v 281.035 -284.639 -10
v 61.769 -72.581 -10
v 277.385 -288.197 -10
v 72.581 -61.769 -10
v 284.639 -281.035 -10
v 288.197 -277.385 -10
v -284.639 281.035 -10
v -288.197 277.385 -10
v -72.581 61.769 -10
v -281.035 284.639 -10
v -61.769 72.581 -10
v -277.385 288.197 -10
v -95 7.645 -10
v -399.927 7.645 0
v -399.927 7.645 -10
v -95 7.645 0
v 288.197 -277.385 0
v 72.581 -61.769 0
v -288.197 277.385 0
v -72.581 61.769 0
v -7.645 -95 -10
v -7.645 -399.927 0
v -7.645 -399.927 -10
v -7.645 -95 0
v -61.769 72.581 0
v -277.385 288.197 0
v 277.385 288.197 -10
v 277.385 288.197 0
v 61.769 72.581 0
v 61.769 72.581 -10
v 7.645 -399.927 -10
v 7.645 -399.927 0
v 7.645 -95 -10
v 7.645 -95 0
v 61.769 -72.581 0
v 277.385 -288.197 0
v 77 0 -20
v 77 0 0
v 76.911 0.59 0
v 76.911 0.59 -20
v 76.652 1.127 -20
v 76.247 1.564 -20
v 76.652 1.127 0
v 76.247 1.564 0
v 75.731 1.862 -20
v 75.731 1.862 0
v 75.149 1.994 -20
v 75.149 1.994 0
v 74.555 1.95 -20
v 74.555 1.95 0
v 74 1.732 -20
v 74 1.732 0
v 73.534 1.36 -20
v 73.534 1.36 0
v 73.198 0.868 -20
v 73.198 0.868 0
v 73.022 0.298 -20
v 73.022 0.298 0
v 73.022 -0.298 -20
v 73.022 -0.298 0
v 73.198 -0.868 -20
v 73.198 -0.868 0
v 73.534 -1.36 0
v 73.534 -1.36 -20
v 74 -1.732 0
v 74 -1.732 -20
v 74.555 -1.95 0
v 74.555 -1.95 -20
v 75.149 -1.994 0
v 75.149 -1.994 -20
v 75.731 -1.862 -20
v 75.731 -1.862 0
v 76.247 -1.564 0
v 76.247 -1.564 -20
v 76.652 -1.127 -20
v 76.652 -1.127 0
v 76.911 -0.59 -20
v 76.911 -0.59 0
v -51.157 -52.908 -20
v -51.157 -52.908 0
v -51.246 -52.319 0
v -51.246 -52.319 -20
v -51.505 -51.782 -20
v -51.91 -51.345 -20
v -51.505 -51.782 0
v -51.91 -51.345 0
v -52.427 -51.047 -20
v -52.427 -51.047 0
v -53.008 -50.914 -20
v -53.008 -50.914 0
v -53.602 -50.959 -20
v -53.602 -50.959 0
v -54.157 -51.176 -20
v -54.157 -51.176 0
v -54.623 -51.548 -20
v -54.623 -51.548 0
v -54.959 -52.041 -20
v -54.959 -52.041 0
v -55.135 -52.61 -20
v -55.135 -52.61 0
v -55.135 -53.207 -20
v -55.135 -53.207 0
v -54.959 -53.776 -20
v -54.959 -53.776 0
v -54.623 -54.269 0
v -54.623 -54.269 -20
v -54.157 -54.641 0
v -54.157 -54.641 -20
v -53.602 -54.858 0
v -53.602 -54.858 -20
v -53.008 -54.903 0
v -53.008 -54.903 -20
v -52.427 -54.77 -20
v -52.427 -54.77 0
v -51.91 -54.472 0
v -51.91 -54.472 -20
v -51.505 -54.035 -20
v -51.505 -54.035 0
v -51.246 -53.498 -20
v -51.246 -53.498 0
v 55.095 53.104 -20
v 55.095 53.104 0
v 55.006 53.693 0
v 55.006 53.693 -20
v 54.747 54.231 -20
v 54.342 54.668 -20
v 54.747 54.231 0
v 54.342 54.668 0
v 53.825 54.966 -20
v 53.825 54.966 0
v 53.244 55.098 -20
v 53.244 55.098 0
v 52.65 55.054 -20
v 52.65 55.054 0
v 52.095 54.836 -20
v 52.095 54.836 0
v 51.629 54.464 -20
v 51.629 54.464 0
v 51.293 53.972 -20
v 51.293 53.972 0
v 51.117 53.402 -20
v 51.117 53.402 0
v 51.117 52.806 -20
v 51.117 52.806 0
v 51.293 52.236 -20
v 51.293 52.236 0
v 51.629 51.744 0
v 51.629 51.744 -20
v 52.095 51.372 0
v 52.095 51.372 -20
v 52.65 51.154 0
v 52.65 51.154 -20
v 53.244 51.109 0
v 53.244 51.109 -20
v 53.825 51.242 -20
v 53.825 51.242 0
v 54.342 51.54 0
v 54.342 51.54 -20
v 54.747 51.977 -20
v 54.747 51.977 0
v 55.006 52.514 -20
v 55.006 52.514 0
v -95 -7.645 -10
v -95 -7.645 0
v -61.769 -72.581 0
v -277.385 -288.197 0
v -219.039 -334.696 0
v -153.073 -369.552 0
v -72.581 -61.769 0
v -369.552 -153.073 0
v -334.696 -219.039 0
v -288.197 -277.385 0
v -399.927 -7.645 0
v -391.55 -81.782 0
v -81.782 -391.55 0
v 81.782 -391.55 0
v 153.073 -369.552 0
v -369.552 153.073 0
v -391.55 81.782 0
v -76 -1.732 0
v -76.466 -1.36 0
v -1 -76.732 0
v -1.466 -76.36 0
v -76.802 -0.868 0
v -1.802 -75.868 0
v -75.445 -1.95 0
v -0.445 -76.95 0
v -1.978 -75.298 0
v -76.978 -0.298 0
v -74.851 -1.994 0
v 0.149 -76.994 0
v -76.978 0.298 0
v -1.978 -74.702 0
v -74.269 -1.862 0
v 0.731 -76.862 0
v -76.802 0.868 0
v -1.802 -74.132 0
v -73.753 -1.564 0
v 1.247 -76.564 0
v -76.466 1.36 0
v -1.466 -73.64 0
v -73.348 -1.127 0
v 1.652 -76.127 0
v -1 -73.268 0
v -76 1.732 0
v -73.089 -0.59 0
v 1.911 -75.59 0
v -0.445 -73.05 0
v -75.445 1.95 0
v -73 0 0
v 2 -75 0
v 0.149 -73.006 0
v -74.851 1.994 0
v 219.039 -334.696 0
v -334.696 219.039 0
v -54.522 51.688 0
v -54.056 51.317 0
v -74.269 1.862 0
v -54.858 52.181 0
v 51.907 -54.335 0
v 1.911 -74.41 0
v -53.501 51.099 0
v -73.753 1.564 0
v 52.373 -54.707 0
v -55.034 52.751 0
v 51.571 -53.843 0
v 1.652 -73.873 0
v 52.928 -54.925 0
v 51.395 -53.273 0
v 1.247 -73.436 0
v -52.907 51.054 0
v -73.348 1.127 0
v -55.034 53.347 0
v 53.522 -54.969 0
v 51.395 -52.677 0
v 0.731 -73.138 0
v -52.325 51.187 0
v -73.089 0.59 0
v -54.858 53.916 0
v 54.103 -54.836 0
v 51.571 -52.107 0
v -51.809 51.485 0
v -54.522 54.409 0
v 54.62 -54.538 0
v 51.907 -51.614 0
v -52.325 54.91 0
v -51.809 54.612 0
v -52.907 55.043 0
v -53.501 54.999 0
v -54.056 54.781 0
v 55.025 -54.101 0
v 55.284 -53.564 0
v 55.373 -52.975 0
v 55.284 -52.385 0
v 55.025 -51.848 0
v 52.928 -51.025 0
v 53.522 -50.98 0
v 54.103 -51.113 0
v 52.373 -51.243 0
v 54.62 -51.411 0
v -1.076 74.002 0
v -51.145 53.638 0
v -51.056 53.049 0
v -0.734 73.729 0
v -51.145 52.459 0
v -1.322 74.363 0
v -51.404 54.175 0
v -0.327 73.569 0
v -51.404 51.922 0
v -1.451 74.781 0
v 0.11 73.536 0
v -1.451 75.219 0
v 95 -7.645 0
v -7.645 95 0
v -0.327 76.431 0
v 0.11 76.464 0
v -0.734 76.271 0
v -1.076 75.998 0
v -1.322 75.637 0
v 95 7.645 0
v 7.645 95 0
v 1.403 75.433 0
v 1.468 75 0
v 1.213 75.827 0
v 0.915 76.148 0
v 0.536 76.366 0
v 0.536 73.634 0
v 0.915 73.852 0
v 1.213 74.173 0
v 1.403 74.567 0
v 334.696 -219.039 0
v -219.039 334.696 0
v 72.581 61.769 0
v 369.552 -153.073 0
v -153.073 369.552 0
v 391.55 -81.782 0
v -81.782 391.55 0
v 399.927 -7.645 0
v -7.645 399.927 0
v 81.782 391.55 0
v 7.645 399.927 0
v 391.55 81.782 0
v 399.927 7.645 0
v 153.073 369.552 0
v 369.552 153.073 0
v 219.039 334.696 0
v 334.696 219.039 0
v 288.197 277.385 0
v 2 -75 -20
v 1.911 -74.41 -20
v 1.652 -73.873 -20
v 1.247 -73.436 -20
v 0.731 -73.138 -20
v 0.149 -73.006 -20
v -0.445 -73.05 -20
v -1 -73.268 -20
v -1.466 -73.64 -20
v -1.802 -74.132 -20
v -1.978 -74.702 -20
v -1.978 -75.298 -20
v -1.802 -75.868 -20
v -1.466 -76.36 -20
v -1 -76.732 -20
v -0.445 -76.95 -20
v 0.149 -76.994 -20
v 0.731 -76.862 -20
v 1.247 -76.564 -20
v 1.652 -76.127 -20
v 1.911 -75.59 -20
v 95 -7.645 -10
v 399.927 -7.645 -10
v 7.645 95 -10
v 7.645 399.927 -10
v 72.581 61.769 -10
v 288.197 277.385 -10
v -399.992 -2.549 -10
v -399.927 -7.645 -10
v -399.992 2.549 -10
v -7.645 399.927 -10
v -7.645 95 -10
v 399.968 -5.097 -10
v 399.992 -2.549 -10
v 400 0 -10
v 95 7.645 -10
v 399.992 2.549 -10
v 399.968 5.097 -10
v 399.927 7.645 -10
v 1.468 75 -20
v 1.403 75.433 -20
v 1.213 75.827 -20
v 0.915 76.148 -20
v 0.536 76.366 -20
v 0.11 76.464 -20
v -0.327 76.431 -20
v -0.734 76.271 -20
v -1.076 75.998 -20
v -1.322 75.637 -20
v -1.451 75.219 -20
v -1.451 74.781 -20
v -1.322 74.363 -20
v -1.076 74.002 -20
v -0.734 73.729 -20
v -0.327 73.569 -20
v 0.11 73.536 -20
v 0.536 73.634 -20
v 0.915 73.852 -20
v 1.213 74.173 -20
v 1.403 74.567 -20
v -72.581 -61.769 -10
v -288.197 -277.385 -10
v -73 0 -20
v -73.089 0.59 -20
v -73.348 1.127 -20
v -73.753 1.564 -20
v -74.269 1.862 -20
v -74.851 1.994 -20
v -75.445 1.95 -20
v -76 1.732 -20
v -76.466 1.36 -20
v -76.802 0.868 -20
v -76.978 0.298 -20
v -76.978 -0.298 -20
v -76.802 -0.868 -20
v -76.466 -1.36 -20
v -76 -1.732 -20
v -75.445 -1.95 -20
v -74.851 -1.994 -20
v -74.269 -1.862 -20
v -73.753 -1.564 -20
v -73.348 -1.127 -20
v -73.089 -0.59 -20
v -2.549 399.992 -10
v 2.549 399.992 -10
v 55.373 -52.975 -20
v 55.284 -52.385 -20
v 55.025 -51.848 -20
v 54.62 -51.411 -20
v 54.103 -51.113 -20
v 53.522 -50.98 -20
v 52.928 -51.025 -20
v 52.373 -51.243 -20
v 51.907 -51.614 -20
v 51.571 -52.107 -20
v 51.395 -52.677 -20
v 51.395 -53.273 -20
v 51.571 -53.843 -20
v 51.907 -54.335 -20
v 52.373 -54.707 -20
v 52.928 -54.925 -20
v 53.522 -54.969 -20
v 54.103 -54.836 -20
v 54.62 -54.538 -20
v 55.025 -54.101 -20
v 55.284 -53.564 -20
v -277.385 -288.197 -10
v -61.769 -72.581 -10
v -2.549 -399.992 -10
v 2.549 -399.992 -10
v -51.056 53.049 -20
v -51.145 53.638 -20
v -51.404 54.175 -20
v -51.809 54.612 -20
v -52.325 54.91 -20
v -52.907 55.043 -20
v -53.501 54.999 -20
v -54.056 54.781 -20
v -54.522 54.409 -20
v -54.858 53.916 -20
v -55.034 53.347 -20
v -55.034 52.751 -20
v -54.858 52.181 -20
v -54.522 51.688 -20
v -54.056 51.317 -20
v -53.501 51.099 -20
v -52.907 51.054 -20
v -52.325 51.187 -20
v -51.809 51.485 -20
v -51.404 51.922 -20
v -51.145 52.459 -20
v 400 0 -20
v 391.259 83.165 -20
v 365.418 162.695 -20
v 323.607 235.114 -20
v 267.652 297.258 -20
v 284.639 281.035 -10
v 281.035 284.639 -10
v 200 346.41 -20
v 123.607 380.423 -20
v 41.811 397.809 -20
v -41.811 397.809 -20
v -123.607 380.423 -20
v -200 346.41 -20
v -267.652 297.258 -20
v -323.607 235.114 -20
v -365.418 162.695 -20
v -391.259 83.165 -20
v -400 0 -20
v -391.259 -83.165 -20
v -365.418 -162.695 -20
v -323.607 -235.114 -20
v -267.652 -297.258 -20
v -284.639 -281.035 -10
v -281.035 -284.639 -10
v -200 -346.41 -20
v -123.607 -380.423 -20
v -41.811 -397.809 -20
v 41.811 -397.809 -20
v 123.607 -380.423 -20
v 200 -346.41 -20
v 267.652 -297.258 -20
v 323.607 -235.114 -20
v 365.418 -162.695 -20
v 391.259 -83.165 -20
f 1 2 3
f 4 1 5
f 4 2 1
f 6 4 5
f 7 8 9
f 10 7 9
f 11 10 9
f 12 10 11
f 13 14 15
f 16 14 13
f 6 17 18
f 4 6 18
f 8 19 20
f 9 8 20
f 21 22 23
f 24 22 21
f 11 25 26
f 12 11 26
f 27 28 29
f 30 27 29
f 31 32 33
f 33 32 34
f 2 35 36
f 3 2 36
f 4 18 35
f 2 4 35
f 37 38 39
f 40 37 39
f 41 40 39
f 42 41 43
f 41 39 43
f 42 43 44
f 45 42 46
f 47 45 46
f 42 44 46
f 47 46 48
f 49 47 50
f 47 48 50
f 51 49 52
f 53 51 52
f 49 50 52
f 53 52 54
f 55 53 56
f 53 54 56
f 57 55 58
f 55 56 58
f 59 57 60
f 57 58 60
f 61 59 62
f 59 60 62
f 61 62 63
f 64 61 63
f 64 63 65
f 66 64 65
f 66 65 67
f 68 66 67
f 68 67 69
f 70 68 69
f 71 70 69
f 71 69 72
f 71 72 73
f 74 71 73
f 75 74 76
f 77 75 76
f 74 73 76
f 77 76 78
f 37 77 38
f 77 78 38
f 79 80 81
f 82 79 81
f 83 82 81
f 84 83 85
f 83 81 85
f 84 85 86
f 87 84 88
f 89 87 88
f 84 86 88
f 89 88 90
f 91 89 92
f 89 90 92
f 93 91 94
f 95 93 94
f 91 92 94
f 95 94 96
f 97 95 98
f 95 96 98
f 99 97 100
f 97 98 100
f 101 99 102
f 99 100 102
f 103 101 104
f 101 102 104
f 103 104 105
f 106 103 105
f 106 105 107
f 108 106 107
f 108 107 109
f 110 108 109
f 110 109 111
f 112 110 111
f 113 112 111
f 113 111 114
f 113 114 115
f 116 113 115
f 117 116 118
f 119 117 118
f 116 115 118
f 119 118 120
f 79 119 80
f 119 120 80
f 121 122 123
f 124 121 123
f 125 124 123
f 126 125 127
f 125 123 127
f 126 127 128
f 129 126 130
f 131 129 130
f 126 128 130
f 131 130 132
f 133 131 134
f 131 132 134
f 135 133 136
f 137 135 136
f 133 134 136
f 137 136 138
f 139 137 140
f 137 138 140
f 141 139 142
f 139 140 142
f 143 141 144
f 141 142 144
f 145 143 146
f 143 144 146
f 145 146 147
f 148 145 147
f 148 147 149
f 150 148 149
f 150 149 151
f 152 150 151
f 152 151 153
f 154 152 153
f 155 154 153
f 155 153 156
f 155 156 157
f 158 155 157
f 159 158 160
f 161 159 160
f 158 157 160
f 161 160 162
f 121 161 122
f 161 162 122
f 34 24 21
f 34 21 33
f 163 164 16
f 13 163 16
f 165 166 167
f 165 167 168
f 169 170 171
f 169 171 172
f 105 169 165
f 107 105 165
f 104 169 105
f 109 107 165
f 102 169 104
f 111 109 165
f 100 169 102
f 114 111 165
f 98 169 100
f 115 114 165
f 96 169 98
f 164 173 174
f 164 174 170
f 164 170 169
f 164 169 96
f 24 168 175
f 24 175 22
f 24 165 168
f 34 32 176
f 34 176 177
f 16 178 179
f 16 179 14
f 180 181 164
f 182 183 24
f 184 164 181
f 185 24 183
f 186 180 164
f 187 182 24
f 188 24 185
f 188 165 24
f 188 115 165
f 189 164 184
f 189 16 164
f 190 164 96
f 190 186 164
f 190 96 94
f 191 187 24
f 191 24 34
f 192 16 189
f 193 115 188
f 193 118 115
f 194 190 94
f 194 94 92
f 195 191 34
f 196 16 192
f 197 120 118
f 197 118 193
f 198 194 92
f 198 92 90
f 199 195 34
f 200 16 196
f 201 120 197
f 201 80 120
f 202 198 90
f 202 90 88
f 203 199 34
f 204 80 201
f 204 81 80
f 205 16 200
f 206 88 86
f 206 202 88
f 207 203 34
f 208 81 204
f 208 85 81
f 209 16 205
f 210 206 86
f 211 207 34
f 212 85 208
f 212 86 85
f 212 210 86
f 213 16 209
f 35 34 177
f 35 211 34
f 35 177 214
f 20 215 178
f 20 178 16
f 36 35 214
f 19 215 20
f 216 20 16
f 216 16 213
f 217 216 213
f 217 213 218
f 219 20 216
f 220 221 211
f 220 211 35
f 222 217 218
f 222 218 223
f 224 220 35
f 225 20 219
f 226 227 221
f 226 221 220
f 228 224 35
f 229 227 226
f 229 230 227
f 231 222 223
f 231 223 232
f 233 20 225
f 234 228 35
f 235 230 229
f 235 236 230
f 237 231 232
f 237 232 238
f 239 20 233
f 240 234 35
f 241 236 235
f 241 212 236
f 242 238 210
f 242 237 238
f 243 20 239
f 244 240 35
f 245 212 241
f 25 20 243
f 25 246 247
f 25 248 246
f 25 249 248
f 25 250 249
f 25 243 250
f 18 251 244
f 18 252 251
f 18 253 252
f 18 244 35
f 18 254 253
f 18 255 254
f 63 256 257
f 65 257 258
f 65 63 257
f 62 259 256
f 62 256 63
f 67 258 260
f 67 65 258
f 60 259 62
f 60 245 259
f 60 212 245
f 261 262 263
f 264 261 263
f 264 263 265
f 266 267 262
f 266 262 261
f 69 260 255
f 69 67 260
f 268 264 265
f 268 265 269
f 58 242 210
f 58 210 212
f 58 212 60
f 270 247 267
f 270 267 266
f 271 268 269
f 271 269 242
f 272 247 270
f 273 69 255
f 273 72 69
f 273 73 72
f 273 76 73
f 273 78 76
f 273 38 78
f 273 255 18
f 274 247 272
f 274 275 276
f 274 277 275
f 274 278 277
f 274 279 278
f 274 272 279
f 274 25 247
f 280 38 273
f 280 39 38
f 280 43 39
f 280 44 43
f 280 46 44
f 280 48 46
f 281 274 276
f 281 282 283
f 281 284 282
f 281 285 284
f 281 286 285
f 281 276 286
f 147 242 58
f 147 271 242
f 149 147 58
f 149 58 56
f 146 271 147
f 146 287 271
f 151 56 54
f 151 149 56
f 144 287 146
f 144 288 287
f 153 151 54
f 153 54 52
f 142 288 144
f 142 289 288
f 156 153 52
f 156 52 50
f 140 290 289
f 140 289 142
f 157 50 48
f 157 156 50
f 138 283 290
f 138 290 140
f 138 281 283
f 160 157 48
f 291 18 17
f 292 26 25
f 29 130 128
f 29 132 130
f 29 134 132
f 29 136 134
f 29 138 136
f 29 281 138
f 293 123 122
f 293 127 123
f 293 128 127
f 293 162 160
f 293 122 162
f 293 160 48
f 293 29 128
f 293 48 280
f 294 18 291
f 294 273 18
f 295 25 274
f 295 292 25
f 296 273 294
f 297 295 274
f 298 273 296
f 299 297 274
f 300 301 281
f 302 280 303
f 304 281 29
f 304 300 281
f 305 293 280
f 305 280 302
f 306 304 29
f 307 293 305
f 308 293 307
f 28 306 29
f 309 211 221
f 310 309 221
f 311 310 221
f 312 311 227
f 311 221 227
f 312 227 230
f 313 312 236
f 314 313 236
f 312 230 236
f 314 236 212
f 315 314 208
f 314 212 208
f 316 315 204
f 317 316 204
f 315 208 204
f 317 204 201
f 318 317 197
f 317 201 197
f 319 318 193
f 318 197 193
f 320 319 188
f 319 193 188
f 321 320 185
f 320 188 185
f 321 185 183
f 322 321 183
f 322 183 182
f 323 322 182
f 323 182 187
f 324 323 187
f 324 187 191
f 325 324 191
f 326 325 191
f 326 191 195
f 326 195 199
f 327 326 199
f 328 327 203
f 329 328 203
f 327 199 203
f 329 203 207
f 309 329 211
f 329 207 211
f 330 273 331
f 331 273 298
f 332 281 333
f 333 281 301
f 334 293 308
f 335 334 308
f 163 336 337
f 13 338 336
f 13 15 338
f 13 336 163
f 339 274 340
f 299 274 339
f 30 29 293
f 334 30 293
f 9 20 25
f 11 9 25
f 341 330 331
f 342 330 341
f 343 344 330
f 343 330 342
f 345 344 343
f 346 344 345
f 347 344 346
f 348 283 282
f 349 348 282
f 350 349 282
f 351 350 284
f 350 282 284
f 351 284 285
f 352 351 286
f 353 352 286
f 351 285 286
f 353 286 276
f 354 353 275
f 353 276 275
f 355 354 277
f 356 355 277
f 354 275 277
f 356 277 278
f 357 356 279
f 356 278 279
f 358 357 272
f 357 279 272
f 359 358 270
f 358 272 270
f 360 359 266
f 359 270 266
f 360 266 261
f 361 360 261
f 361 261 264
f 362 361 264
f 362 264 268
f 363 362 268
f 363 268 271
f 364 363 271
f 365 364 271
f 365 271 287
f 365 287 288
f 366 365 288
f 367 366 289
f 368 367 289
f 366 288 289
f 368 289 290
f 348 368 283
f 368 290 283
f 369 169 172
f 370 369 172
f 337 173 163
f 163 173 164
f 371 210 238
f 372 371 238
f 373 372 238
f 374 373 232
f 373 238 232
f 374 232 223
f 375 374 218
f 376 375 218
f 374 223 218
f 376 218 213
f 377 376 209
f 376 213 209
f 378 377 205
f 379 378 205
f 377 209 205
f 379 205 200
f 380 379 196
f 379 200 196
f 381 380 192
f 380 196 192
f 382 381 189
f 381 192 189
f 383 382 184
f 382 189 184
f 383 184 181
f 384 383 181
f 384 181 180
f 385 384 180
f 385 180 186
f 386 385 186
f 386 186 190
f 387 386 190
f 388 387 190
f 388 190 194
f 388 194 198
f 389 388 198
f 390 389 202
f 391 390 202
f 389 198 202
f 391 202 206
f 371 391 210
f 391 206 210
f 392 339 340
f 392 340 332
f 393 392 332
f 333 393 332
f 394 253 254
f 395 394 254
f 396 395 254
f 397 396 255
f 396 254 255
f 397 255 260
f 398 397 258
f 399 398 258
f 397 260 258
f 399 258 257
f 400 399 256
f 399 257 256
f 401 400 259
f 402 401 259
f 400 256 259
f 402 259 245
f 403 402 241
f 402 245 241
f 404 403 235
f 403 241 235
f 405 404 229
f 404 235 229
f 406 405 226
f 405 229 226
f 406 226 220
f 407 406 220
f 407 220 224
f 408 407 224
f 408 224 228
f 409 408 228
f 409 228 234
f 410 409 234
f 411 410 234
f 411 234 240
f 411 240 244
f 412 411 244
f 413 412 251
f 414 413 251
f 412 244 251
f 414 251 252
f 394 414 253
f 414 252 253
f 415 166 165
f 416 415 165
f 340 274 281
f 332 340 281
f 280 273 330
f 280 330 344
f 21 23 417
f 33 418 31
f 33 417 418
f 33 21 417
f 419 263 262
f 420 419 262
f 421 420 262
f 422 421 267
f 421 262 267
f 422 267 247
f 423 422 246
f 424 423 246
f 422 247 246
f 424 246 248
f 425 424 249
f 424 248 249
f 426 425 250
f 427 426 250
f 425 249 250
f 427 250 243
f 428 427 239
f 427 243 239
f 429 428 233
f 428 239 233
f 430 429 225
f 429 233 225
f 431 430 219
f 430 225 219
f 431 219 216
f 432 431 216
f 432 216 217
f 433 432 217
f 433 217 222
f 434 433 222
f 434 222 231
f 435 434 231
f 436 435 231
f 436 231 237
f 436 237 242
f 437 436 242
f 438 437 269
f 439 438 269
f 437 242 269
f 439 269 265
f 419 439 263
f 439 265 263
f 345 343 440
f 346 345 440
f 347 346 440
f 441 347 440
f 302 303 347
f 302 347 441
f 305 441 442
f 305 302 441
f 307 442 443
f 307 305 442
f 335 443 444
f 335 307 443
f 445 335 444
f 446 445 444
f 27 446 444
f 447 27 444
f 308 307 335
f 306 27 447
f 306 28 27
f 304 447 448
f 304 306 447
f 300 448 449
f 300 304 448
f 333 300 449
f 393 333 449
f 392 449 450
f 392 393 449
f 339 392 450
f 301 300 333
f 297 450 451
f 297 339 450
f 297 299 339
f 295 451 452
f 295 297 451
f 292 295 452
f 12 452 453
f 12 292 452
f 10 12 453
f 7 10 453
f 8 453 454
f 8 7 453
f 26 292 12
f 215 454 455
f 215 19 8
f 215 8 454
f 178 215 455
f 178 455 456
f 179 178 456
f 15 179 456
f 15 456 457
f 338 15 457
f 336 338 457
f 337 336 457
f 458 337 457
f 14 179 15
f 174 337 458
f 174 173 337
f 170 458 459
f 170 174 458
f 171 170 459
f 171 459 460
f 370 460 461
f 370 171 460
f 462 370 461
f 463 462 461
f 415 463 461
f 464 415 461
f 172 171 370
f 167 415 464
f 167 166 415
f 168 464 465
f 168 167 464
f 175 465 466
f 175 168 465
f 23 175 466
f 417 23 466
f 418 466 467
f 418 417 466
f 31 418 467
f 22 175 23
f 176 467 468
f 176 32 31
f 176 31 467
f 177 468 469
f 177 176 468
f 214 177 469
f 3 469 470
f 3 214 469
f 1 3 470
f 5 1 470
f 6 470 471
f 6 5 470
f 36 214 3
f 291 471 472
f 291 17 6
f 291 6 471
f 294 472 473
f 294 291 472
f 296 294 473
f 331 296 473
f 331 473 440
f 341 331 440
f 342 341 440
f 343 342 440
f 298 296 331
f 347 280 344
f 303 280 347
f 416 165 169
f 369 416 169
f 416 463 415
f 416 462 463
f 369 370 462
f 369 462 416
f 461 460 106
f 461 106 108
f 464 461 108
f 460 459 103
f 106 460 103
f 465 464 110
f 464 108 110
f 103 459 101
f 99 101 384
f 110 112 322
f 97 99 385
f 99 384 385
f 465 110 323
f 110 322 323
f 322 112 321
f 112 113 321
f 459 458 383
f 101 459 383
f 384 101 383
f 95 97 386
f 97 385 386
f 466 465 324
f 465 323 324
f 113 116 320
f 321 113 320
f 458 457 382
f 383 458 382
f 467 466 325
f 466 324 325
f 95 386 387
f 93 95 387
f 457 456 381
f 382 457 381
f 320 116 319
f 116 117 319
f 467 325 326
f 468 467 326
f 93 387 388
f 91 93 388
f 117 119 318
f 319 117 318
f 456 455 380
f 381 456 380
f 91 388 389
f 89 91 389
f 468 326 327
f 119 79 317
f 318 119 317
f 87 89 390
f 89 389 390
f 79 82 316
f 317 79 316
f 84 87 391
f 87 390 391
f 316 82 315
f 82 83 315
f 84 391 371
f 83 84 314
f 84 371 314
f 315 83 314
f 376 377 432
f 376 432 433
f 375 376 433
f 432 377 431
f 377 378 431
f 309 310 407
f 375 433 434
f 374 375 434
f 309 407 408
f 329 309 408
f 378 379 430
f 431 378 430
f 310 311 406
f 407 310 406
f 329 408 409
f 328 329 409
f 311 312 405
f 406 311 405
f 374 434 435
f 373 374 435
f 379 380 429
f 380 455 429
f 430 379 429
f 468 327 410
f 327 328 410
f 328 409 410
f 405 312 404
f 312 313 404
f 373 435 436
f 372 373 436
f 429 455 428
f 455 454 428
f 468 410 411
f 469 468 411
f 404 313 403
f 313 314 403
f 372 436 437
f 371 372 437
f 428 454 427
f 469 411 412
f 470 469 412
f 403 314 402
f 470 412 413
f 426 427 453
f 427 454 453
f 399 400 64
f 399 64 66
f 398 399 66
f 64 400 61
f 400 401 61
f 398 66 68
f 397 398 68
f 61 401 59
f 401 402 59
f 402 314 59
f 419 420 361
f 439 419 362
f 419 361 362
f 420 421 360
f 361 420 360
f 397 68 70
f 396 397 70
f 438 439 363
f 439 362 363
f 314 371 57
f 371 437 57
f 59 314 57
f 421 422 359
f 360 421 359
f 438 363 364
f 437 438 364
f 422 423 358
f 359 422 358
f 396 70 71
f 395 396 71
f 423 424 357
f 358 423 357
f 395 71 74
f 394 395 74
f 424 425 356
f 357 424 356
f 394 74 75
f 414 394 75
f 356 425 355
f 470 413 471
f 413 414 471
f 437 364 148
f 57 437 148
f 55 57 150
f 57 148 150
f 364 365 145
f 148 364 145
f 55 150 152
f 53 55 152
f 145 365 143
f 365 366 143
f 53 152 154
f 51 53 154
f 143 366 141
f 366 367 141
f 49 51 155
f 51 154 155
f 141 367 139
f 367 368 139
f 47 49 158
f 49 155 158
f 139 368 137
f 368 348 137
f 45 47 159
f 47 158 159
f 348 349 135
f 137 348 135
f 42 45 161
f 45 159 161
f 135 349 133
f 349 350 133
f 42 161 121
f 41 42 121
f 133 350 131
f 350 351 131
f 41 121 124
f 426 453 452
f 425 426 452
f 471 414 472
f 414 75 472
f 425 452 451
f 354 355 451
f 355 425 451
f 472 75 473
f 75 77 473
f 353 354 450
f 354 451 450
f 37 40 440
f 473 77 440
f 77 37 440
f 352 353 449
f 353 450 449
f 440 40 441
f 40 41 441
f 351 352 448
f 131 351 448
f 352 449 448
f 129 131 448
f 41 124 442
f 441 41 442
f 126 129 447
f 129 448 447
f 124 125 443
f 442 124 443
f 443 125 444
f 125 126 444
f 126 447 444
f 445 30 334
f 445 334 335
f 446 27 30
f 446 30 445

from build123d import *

# Parameters (mm, degrees)
F0_R      = 400
F1_DEPTH  = 20
F3_R      = 2
F4_DEPTH  = 20
F5_R      = 2
F6_DEPTH  = 20
F8_R      = 2
F9_DEPTH  = 20
F10_R     = 2
F11_DEPTH = 20
F12_R     = 2
F13_DEPTH = 20
F14_R     = 2
F15_DEPTH = 20
F16_R     = 1.4677946232
F17_DEPTH = 20
F18_R     = 2
F19_DEPTH = 20
F20_W     = 15.2905675913
F20_H     = 305
F20_W_2   = 305
F20_H_2   = 15.2905675913
F21_DEPTH = 10


with BuildPart() as f1:
    # F0 (on Top) → F1 (new body)
    with BuildSketch(Plane.XY):
        Circle(F0_R)
    extrude(amount=-F1_DEPTH)

    # F3 (on Top) → F4 (cut)
    with BuildSketch(Plane.XY):
        with Locations((-75, 0)):
            Circle(F3_R)
    extrude(amount=-F4_DEPTH, mode=Mode.SUBTRACT)

    # F5 (on Top) → F6 (cut)
    with BuildSketch(Plane.XY):
        with Locations((-53.1572374294, -52.9084880607)):
            Circle(F5_R)
    extrude(amount=-F6_DEPTH, mode=Mode.SUBTRACT)

    # F8 (on offset) → F9 (cut)
    with BuildSketch(Plane.XY):
        with Locations((0, -75)):
            Circle(F8_R)
    extrude(amount=-F9_DEPTH, mode=Mode.SUBTRACT)

    # F10 (on offset) → F11 (cut)
    with BuildSketch(Plane.XY):
        with Locations((53.3727891743, -52.9747456312)):
            Circle(F10_R)
    extrude(amount=-F11_DEPTH, mode=Mode.SUBTRACT)

    # F12 (on offset) → F13 (cut)
    with BuildSketch(Plane.XY):
        with Locations((75, 0)):
            Circle(F12_R)
    extrude(amount=-F13_DEPTH, mode=Mode.SUBTRACT)

    # F14 (on offset) → F15 (cut)
    with BuildSketch(Plane.XY):
        with Locations((53.0946776271, 53.1038790941)):
            Circle(F14_R)
    extrude(amount=-F15_DEPTH, mode=Mode.SUBTRACT)

    # F16 (on offset) → F17 (cut)
    with BuildSketch(Plane.XY):
        with Locations((0, 75)):
            Circle(F16_R)
    extrude(amount=-F17_DEPTH, mode=Mode.SUBTRACT)

    # F18 (on offset) → F19 (cut)
    with BuildSketch(Plane.XY):
        with Locations((-53.0560910702, 53.0486702919)):
            Circle(F18_R)
    extrude(amount=-F19_DEPTH, mode=Mode.SUBTRACT)

    # F20 (on offset) → F21 (cut)
    with BuildSketch(Plane.XY):
        with Locations((0, -247.5)):
            Rectangle(F20_W, F20_H)
        Polygon((288.2487444906, -277.4366804586), (72.5811762287, -61.7691121967), (61.7691121967, -72.5811762287), (277.4366804586, -288.2487444906), align=None)
        with Locations((247.5, 0)):
            Rectangle(F20_W_2, F20_H_2)
        Polygon((277.4366804586, 288.2487444906), (61.7691121967, 72.5811762287), (72.5811762287, 61.7691121967), (288.2487444906, 277.4366804586), align=None)
        with Locations((0, 247.5)):
            Rectangle(F20_W, F20_H)
        Polygon((-288.2487444906, 277.4366804586), (-72.5811762287, 61.7691121967), (-61.7691121967, 72.5811762287), (-277.4366804586, 288.2487444906), align=None)
        with Locations((-247.5, 0)):
            Rectangle(F20_W_2, F20_H_2)
        Polygon((-277.4366804586, -288.2487444906), (-61.7691121967, -72.5811762287), (-72.5811762287, -61.7691121967), (-288.2487444906, -277.4366804586), align=None)
    extrude(amount=-F21_DEPTH, mode=Mode.SUBTRACT)


solid = f1.part
